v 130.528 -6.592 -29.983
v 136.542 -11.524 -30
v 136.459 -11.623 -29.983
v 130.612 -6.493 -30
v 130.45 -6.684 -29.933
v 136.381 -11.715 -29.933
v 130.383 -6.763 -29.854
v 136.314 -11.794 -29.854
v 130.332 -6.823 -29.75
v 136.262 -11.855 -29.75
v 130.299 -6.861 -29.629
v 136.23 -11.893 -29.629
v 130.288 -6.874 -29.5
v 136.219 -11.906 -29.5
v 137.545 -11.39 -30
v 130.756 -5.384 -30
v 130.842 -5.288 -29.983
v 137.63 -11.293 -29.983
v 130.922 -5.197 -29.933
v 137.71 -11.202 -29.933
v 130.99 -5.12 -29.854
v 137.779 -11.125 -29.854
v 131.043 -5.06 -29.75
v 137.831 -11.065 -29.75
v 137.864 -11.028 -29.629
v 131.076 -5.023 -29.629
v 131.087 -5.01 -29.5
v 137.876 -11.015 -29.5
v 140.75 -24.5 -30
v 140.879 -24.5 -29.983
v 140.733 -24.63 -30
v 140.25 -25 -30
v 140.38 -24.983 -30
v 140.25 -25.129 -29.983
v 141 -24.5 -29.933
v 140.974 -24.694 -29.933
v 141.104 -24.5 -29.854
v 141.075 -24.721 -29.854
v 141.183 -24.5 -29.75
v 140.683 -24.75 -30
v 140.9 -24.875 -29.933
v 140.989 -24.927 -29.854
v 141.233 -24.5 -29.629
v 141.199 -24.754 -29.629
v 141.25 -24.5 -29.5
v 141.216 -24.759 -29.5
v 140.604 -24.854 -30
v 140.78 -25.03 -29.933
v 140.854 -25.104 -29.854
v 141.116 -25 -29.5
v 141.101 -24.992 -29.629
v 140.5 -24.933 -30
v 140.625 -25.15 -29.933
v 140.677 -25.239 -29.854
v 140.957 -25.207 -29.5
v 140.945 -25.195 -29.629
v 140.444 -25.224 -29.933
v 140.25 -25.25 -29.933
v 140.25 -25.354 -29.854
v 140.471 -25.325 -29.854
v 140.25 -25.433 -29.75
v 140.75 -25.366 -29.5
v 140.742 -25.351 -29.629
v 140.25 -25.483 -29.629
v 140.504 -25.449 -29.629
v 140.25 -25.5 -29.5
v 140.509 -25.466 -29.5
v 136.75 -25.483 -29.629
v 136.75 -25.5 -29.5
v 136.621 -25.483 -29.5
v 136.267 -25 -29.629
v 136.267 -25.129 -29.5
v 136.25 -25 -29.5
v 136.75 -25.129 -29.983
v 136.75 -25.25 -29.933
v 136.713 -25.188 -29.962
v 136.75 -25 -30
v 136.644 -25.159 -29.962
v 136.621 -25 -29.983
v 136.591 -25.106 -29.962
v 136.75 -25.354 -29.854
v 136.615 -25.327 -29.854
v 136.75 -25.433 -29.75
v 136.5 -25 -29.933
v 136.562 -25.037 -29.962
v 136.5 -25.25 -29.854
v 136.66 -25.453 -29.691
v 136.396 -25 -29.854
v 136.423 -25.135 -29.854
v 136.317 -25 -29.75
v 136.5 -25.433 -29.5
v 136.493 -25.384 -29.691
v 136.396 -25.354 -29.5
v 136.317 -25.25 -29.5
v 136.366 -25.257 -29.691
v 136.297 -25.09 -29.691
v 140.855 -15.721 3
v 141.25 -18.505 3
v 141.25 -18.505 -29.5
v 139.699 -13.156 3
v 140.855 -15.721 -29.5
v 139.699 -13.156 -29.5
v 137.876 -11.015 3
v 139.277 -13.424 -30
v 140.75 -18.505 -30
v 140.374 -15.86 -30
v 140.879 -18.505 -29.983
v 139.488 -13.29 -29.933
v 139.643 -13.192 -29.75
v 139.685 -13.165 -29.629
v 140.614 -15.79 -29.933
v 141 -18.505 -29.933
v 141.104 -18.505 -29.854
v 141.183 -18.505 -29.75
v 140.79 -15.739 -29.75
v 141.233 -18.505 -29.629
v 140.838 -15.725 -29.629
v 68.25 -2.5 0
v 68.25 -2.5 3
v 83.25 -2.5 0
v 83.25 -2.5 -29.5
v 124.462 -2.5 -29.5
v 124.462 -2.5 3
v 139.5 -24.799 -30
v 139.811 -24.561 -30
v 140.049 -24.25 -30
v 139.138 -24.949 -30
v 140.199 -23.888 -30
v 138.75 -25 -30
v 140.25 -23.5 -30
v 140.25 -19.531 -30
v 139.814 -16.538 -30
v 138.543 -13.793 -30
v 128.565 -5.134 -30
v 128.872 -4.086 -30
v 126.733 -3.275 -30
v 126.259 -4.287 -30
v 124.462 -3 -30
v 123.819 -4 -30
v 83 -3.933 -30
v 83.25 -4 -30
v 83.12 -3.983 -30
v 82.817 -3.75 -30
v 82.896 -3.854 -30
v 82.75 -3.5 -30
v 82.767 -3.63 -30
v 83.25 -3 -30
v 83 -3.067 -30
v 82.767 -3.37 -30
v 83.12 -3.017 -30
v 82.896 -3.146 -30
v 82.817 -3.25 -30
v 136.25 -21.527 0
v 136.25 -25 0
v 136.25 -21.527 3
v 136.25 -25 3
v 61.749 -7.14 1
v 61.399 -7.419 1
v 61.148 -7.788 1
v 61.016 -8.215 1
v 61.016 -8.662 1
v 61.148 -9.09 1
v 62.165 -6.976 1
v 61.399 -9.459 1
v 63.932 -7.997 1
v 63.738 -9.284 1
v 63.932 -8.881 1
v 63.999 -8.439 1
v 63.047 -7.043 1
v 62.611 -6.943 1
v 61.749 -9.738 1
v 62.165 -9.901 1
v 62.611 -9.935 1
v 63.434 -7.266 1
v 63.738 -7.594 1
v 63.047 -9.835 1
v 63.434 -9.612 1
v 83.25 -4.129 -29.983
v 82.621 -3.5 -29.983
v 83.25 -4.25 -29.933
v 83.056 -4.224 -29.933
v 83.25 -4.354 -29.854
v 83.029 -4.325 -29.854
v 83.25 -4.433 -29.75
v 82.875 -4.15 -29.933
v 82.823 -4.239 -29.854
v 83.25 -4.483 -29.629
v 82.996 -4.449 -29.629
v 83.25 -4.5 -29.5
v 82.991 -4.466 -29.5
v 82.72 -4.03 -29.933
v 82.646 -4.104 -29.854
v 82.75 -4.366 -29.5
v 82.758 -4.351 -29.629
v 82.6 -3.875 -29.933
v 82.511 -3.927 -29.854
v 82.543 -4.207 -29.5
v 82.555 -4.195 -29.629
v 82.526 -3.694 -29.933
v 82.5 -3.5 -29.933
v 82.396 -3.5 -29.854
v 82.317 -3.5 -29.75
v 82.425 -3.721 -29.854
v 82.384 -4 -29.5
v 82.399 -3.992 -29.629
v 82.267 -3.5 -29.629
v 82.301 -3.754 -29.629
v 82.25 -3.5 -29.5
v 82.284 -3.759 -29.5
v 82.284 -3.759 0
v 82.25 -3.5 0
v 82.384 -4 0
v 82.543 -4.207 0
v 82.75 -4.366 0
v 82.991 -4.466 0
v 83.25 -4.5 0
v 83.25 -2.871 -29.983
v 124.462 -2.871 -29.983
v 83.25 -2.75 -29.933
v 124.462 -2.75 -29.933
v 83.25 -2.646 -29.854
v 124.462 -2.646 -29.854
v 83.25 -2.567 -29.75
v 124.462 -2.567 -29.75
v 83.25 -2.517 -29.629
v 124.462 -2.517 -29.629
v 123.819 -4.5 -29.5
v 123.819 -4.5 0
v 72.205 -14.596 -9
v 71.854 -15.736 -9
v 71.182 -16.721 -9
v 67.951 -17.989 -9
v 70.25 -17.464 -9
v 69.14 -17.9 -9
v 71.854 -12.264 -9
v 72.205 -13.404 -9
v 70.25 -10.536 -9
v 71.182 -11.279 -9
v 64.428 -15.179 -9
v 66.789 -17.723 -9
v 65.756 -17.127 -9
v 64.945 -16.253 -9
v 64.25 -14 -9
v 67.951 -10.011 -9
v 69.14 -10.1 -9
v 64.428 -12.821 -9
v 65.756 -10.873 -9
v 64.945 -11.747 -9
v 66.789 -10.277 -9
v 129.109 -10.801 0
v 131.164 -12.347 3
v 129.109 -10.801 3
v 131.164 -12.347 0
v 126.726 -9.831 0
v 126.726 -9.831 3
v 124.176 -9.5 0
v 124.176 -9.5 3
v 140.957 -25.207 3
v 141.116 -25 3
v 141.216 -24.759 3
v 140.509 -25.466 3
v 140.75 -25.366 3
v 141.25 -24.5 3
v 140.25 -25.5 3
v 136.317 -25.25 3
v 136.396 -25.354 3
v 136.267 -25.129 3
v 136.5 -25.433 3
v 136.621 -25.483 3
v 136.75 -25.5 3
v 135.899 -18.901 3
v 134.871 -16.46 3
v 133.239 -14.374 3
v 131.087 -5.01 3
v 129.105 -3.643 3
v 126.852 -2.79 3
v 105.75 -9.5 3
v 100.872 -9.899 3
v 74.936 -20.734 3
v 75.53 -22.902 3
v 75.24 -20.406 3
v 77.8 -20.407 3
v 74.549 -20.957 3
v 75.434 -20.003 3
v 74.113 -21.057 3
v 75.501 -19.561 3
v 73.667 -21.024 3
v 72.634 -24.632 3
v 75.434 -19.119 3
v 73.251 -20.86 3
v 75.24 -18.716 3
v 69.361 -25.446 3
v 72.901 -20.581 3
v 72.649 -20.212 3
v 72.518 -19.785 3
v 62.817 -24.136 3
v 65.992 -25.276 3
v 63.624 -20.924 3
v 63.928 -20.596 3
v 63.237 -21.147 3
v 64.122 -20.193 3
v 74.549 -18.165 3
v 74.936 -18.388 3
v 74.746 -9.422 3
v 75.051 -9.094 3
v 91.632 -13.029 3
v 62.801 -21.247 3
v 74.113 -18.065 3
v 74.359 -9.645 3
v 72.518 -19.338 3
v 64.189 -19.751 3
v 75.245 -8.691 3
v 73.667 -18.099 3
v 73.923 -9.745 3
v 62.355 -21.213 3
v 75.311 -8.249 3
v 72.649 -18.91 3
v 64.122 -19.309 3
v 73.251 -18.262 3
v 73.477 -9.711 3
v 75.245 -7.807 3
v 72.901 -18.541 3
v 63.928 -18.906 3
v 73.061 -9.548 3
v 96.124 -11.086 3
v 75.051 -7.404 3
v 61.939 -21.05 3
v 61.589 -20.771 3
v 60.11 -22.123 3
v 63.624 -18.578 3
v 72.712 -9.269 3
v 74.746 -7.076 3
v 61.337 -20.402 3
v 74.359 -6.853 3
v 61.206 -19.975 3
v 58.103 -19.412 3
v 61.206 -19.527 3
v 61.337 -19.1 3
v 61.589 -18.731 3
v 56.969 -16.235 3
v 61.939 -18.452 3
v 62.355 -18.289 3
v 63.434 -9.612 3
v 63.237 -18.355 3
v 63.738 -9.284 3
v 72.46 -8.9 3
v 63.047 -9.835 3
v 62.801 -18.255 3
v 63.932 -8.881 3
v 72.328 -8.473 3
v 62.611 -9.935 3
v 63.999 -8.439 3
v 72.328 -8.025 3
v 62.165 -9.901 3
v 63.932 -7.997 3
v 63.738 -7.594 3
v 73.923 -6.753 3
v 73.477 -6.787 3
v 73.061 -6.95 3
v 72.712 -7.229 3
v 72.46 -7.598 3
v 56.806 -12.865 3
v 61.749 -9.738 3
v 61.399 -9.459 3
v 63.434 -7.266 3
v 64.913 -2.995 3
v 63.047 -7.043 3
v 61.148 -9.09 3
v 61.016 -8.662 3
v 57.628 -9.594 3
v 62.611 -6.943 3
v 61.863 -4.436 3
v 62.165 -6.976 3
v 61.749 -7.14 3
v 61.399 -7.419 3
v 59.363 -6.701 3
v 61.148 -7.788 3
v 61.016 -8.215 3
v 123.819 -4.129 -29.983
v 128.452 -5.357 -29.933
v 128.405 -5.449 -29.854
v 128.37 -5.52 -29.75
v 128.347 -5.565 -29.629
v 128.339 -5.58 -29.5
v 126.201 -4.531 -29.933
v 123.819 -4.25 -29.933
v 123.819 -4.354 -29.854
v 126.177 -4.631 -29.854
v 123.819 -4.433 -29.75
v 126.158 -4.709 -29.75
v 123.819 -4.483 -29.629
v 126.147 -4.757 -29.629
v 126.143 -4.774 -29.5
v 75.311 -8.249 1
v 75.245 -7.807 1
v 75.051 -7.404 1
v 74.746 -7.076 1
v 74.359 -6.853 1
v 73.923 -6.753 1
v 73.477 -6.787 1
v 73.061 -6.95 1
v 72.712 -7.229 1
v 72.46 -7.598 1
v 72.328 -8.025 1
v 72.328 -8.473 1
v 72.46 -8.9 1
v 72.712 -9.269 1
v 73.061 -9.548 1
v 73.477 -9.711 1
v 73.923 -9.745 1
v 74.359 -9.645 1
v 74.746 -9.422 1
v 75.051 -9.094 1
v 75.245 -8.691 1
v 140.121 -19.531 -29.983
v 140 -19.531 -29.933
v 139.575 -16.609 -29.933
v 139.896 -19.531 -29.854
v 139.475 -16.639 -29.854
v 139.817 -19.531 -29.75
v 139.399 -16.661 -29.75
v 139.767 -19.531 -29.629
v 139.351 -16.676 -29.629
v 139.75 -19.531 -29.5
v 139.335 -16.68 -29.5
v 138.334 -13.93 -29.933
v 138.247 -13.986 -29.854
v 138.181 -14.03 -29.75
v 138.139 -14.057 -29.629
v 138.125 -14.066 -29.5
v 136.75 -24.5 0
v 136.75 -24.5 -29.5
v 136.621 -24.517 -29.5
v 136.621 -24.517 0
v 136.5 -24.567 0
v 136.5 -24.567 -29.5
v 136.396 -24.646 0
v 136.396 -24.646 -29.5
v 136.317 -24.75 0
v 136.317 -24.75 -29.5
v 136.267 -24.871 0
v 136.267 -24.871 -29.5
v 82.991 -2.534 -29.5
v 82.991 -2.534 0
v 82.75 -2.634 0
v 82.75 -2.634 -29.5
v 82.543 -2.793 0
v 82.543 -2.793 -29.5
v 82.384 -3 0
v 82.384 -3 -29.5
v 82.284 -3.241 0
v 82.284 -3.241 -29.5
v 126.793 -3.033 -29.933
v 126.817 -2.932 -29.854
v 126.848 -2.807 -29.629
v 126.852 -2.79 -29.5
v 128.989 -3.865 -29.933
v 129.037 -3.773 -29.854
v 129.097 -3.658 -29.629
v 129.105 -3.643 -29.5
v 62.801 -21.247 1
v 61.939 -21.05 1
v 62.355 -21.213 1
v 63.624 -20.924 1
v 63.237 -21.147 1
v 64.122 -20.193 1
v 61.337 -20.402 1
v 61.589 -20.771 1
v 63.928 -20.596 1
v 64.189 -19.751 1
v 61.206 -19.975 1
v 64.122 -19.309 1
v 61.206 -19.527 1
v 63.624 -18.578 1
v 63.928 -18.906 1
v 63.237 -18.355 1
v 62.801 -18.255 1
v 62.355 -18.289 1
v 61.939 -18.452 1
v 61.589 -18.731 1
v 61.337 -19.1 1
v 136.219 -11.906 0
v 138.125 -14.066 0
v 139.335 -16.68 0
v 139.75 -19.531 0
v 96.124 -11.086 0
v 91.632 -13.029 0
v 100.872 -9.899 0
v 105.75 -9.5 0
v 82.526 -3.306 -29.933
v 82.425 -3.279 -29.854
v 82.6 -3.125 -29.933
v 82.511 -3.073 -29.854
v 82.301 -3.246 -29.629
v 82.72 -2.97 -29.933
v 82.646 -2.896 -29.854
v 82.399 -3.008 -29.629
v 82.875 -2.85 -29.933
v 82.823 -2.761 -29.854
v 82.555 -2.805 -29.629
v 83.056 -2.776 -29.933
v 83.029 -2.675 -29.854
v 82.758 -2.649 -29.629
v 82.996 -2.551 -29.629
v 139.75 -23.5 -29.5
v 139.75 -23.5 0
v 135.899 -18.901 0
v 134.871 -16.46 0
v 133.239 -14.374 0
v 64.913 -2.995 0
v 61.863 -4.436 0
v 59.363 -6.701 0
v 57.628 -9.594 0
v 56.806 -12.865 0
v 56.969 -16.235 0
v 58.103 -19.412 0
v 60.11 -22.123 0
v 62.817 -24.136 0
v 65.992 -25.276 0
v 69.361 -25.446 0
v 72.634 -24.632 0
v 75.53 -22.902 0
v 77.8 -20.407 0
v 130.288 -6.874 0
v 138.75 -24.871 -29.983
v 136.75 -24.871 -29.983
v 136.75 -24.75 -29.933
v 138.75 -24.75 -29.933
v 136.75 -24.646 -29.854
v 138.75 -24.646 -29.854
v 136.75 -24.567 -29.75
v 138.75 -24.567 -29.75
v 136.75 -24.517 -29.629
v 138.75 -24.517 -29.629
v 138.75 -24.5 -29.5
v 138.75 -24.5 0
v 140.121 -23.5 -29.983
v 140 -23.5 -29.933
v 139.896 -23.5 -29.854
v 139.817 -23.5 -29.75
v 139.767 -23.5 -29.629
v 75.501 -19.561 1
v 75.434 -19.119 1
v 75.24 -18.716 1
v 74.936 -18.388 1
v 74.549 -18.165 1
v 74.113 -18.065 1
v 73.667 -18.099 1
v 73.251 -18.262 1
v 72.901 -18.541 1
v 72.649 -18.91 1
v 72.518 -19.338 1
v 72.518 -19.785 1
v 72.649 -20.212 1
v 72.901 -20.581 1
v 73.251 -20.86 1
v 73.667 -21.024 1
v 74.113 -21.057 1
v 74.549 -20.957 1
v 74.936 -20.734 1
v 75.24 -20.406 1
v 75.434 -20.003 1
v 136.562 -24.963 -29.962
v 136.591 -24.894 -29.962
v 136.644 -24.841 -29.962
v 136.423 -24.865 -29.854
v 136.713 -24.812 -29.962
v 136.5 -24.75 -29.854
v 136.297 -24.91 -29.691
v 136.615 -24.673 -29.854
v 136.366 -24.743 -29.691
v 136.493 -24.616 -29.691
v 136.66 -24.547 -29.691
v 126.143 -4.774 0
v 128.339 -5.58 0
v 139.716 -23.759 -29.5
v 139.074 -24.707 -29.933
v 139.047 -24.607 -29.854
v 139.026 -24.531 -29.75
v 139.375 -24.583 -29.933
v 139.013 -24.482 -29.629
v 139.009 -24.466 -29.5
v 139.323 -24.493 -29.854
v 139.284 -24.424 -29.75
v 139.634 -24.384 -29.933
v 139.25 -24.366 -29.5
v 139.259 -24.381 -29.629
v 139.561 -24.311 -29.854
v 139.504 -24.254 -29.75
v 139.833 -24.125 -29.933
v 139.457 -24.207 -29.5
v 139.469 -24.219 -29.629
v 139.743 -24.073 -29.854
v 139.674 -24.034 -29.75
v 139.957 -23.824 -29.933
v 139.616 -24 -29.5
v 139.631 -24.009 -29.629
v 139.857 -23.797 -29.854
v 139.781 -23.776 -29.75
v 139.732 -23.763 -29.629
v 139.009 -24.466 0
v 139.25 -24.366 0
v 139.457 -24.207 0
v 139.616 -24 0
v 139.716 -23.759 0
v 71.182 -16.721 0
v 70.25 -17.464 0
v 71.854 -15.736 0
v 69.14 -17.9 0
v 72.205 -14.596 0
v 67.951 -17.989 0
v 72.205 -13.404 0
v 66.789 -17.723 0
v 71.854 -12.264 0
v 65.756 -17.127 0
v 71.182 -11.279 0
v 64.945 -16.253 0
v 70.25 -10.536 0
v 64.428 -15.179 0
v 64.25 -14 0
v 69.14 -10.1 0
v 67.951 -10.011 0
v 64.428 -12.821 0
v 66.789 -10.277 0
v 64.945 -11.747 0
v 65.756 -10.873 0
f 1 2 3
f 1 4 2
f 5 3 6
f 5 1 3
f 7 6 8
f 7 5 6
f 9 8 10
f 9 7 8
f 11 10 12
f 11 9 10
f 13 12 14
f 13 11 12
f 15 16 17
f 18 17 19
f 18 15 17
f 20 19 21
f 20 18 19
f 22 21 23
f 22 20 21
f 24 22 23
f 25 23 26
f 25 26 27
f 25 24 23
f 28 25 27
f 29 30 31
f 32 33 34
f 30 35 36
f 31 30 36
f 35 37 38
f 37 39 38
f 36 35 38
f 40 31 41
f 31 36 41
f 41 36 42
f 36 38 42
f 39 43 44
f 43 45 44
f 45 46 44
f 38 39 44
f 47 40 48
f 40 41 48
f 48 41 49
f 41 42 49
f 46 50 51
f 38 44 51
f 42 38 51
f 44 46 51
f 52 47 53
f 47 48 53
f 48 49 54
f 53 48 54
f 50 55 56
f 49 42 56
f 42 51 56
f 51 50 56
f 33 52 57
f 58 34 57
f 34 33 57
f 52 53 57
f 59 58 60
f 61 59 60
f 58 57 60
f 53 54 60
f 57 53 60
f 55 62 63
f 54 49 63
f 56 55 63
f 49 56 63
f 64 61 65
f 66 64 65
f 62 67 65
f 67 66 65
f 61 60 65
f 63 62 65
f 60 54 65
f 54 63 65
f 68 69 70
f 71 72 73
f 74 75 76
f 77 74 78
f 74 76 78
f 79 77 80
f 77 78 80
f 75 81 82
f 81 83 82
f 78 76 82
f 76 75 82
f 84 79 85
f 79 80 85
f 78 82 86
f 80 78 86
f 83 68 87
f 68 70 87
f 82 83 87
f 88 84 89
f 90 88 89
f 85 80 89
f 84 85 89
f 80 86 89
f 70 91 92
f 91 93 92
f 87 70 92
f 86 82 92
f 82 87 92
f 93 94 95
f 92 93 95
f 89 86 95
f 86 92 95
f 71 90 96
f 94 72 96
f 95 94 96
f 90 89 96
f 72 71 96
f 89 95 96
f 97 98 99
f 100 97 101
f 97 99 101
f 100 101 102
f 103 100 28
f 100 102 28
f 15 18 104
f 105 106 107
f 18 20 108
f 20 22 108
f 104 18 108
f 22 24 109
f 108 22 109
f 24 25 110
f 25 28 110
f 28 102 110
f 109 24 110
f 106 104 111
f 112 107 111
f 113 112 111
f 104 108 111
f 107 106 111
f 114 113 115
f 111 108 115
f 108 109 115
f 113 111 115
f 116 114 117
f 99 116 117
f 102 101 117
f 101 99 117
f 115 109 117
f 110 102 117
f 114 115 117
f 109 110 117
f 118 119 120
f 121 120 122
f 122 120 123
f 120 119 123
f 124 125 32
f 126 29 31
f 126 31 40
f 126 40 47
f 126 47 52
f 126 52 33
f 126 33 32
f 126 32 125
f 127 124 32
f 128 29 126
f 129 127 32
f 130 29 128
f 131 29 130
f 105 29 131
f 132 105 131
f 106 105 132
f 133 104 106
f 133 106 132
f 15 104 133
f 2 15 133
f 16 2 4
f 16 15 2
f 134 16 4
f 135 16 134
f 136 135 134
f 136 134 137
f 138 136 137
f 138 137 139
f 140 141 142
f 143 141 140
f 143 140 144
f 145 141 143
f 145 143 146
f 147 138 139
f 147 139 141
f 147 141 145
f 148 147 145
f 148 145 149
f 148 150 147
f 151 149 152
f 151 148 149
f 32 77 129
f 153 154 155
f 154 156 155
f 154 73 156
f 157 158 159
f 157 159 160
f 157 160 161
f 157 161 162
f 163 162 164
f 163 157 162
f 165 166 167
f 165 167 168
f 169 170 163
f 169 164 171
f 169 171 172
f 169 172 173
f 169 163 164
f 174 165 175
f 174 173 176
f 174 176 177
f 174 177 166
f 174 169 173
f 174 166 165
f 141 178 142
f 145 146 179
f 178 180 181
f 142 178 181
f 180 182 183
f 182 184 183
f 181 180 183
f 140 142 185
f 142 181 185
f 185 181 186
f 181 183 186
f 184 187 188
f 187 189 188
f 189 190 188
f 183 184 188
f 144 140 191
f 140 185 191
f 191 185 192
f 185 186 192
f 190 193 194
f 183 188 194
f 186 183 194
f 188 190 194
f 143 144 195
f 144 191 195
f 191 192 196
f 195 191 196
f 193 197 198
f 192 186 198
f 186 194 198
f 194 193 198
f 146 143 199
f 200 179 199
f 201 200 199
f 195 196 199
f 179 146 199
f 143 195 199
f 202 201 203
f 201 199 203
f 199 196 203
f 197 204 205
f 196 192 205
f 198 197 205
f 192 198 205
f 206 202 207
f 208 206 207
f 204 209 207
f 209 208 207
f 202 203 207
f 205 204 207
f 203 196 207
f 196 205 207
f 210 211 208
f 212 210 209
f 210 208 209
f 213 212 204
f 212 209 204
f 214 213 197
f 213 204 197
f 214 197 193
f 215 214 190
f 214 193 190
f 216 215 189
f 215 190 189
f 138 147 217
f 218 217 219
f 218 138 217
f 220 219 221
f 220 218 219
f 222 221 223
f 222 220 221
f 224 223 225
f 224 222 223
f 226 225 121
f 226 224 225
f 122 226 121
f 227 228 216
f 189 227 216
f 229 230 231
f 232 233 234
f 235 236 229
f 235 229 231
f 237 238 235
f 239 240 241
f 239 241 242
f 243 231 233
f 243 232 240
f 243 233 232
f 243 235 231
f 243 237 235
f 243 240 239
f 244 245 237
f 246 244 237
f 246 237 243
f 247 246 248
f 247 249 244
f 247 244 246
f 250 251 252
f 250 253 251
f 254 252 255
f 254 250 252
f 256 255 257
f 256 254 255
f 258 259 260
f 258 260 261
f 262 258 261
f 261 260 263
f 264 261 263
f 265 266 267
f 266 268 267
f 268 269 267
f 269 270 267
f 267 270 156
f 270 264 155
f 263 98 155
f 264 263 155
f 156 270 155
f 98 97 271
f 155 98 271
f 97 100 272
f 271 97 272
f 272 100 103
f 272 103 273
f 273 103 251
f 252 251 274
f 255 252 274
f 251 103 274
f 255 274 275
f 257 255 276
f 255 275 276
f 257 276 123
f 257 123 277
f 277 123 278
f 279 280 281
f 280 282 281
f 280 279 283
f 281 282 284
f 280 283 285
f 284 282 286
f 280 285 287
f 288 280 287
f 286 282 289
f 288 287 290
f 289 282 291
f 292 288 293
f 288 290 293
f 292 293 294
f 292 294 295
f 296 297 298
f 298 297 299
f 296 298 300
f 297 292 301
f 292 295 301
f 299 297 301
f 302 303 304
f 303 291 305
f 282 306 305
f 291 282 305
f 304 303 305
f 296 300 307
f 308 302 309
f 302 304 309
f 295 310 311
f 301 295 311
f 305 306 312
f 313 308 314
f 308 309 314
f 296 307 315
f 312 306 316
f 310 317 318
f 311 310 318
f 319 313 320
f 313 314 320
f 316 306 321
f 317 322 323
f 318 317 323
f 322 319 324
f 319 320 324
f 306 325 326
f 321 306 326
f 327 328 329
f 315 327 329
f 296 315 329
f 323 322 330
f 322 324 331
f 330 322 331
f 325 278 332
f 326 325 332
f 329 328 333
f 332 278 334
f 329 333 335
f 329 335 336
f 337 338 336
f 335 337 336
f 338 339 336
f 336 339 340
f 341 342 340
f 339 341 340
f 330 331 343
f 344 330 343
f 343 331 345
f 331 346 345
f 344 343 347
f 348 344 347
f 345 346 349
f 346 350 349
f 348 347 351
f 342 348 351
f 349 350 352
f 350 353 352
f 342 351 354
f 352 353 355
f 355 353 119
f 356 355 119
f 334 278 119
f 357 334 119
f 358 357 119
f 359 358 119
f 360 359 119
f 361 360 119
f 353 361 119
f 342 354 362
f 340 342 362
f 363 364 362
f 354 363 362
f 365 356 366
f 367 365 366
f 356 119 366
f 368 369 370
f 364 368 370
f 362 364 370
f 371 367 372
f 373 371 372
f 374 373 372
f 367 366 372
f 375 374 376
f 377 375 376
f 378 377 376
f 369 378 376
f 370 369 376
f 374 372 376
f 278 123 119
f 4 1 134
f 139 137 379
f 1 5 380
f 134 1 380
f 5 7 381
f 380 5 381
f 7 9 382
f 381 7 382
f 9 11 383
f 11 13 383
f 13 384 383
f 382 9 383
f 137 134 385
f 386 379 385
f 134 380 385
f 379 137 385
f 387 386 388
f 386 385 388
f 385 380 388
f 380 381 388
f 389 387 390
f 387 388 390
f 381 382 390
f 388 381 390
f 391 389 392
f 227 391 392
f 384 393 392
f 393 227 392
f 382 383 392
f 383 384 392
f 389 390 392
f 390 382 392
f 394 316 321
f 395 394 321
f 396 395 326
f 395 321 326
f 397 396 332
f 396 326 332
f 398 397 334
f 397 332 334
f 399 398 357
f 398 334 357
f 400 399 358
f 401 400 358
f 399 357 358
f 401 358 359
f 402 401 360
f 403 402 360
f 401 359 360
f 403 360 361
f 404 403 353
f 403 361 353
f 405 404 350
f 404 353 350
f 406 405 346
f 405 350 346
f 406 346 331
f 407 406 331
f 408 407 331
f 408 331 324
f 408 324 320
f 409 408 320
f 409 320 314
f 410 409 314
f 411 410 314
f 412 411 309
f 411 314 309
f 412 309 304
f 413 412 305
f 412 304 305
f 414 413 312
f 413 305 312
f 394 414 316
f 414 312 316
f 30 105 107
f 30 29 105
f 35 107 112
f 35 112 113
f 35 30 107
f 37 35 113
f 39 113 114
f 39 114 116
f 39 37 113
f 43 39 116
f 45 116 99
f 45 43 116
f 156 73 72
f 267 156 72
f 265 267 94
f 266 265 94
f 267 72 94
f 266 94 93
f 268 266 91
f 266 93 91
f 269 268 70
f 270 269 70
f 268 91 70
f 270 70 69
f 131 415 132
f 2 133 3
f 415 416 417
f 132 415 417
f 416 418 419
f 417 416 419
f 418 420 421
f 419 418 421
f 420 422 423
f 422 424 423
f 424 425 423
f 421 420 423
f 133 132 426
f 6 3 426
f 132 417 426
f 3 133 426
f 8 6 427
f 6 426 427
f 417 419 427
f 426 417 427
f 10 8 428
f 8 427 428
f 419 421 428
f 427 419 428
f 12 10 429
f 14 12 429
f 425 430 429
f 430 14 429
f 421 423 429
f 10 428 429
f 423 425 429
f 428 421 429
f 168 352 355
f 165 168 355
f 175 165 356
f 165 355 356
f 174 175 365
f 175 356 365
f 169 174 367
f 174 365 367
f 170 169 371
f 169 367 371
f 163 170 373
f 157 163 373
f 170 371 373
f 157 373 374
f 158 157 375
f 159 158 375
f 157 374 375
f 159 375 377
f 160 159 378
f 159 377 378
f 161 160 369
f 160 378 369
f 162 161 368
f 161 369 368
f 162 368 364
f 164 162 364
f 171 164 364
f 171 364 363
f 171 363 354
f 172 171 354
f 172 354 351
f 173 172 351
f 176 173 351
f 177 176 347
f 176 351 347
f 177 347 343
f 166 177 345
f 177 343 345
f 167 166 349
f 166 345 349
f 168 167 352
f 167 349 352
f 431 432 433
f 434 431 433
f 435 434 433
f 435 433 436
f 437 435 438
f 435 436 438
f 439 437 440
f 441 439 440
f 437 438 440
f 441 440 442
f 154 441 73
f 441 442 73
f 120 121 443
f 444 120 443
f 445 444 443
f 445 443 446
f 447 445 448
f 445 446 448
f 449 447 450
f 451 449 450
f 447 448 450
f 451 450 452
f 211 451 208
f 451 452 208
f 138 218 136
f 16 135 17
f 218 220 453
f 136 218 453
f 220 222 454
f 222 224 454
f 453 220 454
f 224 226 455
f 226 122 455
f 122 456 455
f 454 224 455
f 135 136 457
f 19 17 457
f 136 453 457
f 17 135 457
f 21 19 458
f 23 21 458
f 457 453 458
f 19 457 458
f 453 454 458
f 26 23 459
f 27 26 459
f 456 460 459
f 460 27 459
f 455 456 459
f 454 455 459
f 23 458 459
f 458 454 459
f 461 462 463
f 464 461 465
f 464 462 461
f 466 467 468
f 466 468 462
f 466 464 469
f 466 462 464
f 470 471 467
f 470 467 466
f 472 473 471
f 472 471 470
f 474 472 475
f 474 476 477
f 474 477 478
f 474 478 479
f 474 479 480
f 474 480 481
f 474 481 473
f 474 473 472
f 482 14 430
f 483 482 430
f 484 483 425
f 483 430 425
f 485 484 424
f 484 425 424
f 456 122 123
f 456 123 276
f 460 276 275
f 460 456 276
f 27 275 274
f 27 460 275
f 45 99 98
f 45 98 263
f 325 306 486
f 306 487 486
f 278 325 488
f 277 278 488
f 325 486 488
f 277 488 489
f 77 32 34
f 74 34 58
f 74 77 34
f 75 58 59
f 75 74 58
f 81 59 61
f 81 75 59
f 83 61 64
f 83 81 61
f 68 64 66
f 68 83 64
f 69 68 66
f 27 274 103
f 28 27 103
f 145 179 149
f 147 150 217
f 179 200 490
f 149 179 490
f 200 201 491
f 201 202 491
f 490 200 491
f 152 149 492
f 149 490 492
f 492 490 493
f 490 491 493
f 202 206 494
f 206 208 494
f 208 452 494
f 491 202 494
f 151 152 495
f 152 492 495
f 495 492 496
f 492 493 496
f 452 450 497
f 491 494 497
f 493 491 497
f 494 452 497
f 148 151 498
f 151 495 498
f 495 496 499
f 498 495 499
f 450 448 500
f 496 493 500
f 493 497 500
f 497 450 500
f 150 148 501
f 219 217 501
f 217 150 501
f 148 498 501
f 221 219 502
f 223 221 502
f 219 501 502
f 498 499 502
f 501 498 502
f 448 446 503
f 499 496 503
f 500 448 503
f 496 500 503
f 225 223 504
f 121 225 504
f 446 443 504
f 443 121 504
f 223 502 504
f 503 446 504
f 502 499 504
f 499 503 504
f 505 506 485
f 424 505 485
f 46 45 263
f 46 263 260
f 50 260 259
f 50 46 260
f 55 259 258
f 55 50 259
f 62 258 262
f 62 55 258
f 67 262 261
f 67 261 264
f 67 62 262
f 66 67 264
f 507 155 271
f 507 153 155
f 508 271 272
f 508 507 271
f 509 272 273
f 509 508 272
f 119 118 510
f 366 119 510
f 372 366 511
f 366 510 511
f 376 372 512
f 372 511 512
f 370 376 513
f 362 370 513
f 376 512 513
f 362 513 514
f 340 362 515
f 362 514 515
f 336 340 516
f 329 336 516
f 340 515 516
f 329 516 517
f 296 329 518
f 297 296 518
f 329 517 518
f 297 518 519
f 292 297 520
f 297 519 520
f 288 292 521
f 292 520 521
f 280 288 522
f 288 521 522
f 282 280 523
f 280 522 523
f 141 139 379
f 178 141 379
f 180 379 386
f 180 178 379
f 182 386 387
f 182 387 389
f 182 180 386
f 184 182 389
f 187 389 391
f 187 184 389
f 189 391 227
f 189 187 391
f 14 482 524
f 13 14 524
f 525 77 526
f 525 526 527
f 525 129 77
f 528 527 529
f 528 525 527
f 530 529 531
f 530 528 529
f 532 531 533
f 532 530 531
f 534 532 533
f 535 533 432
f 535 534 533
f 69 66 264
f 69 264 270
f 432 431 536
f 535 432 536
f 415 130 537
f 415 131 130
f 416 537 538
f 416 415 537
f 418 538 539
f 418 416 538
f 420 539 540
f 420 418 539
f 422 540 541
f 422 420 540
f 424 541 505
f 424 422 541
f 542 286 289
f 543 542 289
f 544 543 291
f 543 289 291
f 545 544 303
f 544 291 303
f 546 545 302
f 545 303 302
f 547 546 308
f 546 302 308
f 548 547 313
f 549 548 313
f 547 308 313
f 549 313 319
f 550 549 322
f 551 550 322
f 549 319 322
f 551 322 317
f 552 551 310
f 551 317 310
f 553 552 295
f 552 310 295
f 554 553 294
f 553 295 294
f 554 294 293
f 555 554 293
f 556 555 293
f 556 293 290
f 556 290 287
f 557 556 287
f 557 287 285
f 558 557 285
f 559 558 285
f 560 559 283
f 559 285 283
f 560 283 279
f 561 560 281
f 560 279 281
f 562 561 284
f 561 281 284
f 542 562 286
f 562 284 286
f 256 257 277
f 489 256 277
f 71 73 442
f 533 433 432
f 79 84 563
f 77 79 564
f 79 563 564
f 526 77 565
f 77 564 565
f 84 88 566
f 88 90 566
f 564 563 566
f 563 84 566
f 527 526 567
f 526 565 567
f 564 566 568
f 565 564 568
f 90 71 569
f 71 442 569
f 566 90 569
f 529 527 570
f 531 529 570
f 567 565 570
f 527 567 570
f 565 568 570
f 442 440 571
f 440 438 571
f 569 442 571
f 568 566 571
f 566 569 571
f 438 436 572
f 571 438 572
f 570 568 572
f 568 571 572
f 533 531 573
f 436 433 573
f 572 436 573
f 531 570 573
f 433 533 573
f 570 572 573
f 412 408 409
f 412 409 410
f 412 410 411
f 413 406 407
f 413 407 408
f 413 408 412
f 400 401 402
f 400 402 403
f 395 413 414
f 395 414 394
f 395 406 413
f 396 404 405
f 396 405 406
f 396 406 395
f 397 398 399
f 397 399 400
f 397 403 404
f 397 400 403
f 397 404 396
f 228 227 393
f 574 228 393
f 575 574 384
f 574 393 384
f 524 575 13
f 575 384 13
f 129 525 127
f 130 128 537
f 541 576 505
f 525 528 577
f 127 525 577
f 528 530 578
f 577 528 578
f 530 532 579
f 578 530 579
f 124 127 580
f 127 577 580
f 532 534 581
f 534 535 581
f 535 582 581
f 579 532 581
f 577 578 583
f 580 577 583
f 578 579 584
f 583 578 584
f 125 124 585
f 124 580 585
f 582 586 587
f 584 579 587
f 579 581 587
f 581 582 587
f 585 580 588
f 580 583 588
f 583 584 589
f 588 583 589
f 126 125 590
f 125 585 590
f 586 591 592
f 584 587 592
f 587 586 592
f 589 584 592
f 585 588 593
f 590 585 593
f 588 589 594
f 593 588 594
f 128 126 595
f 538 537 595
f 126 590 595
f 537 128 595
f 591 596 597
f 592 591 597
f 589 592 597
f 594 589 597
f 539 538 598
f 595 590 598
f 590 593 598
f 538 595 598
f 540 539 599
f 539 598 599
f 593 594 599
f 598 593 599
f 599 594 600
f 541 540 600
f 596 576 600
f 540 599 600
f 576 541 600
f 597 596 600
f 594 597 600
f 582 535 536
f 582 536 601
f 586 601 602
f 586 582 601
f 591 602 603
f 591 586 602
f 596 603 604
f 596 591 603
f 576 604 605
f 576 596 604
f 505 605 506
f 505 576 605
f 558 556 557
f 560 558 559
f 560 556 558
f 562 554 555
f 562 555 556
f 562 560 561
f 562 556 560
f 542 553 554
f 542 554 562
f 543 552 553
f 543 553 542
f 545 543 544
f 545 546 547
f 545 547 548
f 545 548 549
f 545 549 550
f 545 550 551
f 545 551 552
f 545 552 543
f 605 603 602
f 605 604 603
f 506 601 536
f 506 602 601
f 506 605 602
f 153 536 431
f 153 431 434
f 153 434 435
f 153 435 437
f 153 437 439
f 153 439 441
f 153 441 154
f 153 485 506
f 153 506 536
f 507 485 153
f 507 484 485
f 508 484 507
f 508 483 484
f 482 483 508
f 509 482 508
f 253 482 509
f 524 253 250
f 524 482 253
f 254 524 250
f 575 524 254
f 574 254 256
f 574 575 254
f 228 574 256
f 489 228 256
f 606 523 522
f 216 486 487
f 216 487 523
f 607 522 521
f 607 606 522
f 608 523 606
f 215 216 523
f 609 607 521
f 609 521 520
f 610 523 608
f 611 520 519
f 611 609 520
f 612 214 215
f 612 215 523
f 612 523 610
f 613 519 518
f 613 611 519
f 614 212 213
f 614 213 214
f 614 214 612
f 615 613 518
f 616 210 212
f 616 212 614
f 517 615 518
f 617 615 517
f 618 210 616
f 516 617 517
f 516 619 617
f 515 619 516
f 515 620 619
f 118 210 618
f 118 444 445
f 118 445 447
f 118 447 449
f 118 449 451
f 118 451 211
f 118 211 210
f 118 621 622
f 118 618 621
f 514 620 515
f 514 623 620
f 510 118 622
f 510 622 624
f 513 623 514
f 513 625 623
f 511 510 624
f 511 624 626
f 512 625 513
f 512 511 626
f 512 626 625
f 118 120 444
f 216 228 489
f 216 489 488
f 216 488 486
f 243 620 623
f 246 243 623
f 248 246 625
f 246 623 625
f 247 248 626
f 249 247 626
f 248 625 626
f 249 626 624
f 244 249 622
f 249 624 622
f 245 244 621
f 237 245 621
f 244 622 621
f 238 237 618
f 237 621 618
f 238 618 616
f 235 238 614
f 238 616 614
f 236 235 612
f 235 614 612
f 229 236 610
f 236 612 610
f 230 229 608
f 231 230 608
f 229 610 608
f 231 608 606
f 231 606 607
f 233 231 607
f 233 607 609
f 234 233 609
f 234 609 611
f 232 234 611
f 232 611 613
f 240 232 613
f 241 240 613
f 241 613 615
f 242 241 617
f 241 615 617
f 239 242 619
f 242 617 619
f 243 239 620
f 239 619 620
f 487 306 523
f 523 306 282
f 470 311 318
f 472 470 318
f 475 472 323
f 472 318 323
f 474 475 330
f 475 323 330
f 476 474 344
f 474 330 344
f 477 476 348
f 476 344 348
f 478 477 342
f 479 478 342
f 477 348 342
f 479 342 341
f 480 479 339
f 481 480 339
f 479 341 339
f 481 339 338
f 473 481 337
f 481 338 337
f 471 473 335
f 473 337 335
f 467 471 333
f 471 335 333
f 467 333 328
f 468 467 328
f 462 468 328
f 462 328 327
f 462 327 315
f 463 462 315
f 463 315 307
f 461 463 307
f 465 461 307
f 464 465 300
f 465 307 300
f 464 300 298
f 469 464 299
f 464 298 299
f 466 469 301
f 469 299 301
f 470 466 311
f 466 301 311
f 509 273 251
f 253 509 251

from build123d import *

# Parameters (mm, degrees)
SZKIC1_R                    = 11.5
DODANIE_WYCI_GNI_CIE1_DEPTH = 3
SZKIC2_R                    = 4
DODANIE_WYCI_GNI_CIE2_DEPTH = 9
SZKIC3_R                    = 1.5
WYTNIJ_WYCI_GNI_CIE1_DEPTH  = 2
DODANIE_WYCI_GNI_CIE3_DEPTH = 3
DODANIE_WYCI_GNI_CIE4_DEPTH = 30
ZAOKR_GLENIE1_R             = 10
ZAOKR_GLENIE2_R             = 30
ZAOKR_GLENIE6_R             = 1
ZAOKR_GLENIE8_R             = 0.5
ZAOKR_GLENIE9_R             = 0.5


with BuildPart() as part:
    # Szkic1 → Dodanie-wyciągnięcie1 (new body)
    with BuildSketch(Plane.XY):
        with Locations((68.25, -14)):
            Circle(SZKIC1_R)
    extrude(amount=DODANIE_WYCI_GNI_CIE1_DEPTH)

    # Szkic2 → Dodanie-wyciągnięcie2 (add)
    with BuildSketch(Plane(origin=(0, 0, 0), x_dir=(-1, 0, 0), z_dir=(0, 0, -1))):
        with Locations((-68.25, -14)):
            Circle(SZKIC2_R)
    extrude(amount=DODANIE_WYCI_GNI_CIE2_DEPTH)

    # Szkic3 → Wytnij-wyciągnięcie1 (cut)
    with BuildSketch(Plane.XY.offset(3)):
        with Locations((74.000947528, -19.561169169)):
            Circle(SZKIC3_R)
        with Locations((73.811169169, -8.249052472)):
            Circle(SZKIC3_R)
        with Locations((62.499052472, -8.438830831)):
            Circle(SZKIC3_R)
        with Locations((62.688830831, -19.750947528)):
            Circle(SZKIC3_R)
    extrude(amount=-WYTNIJ_WYCI_GNI_CIE1_DEPTH, mode=Mode.SUBTRACT)

    # Szkic4 → Dodanie-wyciągnięcie3 (add)
    with BuildSketch(Plane.XY.offset(3)):
        Polygon((68.25, -2.5), (128.25, -2.5), (141.25, -14), (141.25, -25.5), (136.25, -25.5), (136.25, -17.31662479), (128.25, -9.5), (98.25, -9.5), (77.80017301, -20.406574394), (76.895320055, -6.416567983), align=None)
    extrude(amount=-DODANIE_WYCI_GNI_CIE3_DEPTH)

    # Szkic6 → Dodanie-wyciągnięcie4 (add)
    with BuildSketch(Plane(origin=(0, 0, 0), x_dir=(-1, 0, 0), z_dir=(0, 0, -1))):
        Polygon((-82.25, -2.5), (-128.25, -2.5), (-141.25, -14), (-141.25, -25.5), (-136.25, -25.5), (-136.25, -24.5), (-139.75, -24.5), (-139.75, -14.901008455), (-127.489427722, -4.5), (-82.25, -4.5), align=None)
    extrude(amount=DODANIE_WYCI_GNI_CIE4_DEPTH)

    # Zaokrąglenie1
    zaokr_glenie1_edges = [part.edges().sort_by_distance(p)[0] for p in [
        (128.25, -2.5, -13.5),
        (141.25, -14, -13.5),
        (136.25, -17.31662479, 1.5),
        (128.25, -9.5, 1.5),
        (139.75, -14.901008455, -15),
        (127.489427722, -4.5, -15),
    ]]
    fillet(zaokr_glenie1_edges, radius=ZAOKR_GLENIE1_R)

    # Zaokrąglenie2
    zaokr_glenie2_edges = [part.edges().sort_by_distance(p)[0] for p in [
        (98.25, -9.5, 1.5),
    ]]
    fillet(zaokr_glenie2_edges, radius=ZAOKR_GLENIE2_R)

    # Zaokrąglenie6
    zaokr_glenie6_edges = [part.edges().sort_by_distance(p)[0] for p in [
        (141.25, -25.5, -13.5),
        (139.75, -24.5, -15),
        (82.25, -2.5, -15),
        (82.25, -4.5, -15),
    ]]
    fillet(zaokr_glenie6_edges, radius=ZAOKR_GLENIE6_R - 0.0001)  # a hair under: the kernel refuses the full size

    # Zaokrąglenie8
    zaokr_glenie8_edges = [part.edges().sort_by_distance(p)[0] for p in [
        (136.25, -25.5, -13.5),
        (136.25, -24.5, -15),
    ]]
    fillet(zaokr_glenie8_edges, radius=ZAOKR_GLENIE8_R - 0.0001)  # a hair under: the kernel refuses the full size

    # Zaokrąglenie9
    zaokr_glenie9_edges = [part.edges().sort_by_distance(p)[0] for p in [
        (141.25, -21.502571138, -30),
        (140.36749385, -14.397572751, -30),
        (128.004313516, -3.148538717, -30),
        (138.824438517, -15.329570819, -30),
        (127.264686983, -5.112328638, -30),
        (103.855795671, -2.5, -30),
        (138.5, -25.5, -30),
        (139.75, -21.515702231, -30),
        (140.957136071, -25.207136071, -30),
        (82.542863929, -4.207136071, -30),
        (82.542863929, -2.792863929, -30),
        (139.457136071, -24.207136071, -30),
        (137.75, -24.5, -30),
        (136.39641732, -24.64641732, -30),
        (136.39641732, -25.35358268, -30),
        (133.253669041, -9.38997751, -30),
        (103.534532162, -4.5, -30),
        (134.481584493, -8.012555513, -30),
    ]]
    fillet(zaokr_glenie9_edges, radius=ZAOKR_GLENIE9_R - 0.0001)  # a hair under: the kernel refuses the full size


solid = part.part
